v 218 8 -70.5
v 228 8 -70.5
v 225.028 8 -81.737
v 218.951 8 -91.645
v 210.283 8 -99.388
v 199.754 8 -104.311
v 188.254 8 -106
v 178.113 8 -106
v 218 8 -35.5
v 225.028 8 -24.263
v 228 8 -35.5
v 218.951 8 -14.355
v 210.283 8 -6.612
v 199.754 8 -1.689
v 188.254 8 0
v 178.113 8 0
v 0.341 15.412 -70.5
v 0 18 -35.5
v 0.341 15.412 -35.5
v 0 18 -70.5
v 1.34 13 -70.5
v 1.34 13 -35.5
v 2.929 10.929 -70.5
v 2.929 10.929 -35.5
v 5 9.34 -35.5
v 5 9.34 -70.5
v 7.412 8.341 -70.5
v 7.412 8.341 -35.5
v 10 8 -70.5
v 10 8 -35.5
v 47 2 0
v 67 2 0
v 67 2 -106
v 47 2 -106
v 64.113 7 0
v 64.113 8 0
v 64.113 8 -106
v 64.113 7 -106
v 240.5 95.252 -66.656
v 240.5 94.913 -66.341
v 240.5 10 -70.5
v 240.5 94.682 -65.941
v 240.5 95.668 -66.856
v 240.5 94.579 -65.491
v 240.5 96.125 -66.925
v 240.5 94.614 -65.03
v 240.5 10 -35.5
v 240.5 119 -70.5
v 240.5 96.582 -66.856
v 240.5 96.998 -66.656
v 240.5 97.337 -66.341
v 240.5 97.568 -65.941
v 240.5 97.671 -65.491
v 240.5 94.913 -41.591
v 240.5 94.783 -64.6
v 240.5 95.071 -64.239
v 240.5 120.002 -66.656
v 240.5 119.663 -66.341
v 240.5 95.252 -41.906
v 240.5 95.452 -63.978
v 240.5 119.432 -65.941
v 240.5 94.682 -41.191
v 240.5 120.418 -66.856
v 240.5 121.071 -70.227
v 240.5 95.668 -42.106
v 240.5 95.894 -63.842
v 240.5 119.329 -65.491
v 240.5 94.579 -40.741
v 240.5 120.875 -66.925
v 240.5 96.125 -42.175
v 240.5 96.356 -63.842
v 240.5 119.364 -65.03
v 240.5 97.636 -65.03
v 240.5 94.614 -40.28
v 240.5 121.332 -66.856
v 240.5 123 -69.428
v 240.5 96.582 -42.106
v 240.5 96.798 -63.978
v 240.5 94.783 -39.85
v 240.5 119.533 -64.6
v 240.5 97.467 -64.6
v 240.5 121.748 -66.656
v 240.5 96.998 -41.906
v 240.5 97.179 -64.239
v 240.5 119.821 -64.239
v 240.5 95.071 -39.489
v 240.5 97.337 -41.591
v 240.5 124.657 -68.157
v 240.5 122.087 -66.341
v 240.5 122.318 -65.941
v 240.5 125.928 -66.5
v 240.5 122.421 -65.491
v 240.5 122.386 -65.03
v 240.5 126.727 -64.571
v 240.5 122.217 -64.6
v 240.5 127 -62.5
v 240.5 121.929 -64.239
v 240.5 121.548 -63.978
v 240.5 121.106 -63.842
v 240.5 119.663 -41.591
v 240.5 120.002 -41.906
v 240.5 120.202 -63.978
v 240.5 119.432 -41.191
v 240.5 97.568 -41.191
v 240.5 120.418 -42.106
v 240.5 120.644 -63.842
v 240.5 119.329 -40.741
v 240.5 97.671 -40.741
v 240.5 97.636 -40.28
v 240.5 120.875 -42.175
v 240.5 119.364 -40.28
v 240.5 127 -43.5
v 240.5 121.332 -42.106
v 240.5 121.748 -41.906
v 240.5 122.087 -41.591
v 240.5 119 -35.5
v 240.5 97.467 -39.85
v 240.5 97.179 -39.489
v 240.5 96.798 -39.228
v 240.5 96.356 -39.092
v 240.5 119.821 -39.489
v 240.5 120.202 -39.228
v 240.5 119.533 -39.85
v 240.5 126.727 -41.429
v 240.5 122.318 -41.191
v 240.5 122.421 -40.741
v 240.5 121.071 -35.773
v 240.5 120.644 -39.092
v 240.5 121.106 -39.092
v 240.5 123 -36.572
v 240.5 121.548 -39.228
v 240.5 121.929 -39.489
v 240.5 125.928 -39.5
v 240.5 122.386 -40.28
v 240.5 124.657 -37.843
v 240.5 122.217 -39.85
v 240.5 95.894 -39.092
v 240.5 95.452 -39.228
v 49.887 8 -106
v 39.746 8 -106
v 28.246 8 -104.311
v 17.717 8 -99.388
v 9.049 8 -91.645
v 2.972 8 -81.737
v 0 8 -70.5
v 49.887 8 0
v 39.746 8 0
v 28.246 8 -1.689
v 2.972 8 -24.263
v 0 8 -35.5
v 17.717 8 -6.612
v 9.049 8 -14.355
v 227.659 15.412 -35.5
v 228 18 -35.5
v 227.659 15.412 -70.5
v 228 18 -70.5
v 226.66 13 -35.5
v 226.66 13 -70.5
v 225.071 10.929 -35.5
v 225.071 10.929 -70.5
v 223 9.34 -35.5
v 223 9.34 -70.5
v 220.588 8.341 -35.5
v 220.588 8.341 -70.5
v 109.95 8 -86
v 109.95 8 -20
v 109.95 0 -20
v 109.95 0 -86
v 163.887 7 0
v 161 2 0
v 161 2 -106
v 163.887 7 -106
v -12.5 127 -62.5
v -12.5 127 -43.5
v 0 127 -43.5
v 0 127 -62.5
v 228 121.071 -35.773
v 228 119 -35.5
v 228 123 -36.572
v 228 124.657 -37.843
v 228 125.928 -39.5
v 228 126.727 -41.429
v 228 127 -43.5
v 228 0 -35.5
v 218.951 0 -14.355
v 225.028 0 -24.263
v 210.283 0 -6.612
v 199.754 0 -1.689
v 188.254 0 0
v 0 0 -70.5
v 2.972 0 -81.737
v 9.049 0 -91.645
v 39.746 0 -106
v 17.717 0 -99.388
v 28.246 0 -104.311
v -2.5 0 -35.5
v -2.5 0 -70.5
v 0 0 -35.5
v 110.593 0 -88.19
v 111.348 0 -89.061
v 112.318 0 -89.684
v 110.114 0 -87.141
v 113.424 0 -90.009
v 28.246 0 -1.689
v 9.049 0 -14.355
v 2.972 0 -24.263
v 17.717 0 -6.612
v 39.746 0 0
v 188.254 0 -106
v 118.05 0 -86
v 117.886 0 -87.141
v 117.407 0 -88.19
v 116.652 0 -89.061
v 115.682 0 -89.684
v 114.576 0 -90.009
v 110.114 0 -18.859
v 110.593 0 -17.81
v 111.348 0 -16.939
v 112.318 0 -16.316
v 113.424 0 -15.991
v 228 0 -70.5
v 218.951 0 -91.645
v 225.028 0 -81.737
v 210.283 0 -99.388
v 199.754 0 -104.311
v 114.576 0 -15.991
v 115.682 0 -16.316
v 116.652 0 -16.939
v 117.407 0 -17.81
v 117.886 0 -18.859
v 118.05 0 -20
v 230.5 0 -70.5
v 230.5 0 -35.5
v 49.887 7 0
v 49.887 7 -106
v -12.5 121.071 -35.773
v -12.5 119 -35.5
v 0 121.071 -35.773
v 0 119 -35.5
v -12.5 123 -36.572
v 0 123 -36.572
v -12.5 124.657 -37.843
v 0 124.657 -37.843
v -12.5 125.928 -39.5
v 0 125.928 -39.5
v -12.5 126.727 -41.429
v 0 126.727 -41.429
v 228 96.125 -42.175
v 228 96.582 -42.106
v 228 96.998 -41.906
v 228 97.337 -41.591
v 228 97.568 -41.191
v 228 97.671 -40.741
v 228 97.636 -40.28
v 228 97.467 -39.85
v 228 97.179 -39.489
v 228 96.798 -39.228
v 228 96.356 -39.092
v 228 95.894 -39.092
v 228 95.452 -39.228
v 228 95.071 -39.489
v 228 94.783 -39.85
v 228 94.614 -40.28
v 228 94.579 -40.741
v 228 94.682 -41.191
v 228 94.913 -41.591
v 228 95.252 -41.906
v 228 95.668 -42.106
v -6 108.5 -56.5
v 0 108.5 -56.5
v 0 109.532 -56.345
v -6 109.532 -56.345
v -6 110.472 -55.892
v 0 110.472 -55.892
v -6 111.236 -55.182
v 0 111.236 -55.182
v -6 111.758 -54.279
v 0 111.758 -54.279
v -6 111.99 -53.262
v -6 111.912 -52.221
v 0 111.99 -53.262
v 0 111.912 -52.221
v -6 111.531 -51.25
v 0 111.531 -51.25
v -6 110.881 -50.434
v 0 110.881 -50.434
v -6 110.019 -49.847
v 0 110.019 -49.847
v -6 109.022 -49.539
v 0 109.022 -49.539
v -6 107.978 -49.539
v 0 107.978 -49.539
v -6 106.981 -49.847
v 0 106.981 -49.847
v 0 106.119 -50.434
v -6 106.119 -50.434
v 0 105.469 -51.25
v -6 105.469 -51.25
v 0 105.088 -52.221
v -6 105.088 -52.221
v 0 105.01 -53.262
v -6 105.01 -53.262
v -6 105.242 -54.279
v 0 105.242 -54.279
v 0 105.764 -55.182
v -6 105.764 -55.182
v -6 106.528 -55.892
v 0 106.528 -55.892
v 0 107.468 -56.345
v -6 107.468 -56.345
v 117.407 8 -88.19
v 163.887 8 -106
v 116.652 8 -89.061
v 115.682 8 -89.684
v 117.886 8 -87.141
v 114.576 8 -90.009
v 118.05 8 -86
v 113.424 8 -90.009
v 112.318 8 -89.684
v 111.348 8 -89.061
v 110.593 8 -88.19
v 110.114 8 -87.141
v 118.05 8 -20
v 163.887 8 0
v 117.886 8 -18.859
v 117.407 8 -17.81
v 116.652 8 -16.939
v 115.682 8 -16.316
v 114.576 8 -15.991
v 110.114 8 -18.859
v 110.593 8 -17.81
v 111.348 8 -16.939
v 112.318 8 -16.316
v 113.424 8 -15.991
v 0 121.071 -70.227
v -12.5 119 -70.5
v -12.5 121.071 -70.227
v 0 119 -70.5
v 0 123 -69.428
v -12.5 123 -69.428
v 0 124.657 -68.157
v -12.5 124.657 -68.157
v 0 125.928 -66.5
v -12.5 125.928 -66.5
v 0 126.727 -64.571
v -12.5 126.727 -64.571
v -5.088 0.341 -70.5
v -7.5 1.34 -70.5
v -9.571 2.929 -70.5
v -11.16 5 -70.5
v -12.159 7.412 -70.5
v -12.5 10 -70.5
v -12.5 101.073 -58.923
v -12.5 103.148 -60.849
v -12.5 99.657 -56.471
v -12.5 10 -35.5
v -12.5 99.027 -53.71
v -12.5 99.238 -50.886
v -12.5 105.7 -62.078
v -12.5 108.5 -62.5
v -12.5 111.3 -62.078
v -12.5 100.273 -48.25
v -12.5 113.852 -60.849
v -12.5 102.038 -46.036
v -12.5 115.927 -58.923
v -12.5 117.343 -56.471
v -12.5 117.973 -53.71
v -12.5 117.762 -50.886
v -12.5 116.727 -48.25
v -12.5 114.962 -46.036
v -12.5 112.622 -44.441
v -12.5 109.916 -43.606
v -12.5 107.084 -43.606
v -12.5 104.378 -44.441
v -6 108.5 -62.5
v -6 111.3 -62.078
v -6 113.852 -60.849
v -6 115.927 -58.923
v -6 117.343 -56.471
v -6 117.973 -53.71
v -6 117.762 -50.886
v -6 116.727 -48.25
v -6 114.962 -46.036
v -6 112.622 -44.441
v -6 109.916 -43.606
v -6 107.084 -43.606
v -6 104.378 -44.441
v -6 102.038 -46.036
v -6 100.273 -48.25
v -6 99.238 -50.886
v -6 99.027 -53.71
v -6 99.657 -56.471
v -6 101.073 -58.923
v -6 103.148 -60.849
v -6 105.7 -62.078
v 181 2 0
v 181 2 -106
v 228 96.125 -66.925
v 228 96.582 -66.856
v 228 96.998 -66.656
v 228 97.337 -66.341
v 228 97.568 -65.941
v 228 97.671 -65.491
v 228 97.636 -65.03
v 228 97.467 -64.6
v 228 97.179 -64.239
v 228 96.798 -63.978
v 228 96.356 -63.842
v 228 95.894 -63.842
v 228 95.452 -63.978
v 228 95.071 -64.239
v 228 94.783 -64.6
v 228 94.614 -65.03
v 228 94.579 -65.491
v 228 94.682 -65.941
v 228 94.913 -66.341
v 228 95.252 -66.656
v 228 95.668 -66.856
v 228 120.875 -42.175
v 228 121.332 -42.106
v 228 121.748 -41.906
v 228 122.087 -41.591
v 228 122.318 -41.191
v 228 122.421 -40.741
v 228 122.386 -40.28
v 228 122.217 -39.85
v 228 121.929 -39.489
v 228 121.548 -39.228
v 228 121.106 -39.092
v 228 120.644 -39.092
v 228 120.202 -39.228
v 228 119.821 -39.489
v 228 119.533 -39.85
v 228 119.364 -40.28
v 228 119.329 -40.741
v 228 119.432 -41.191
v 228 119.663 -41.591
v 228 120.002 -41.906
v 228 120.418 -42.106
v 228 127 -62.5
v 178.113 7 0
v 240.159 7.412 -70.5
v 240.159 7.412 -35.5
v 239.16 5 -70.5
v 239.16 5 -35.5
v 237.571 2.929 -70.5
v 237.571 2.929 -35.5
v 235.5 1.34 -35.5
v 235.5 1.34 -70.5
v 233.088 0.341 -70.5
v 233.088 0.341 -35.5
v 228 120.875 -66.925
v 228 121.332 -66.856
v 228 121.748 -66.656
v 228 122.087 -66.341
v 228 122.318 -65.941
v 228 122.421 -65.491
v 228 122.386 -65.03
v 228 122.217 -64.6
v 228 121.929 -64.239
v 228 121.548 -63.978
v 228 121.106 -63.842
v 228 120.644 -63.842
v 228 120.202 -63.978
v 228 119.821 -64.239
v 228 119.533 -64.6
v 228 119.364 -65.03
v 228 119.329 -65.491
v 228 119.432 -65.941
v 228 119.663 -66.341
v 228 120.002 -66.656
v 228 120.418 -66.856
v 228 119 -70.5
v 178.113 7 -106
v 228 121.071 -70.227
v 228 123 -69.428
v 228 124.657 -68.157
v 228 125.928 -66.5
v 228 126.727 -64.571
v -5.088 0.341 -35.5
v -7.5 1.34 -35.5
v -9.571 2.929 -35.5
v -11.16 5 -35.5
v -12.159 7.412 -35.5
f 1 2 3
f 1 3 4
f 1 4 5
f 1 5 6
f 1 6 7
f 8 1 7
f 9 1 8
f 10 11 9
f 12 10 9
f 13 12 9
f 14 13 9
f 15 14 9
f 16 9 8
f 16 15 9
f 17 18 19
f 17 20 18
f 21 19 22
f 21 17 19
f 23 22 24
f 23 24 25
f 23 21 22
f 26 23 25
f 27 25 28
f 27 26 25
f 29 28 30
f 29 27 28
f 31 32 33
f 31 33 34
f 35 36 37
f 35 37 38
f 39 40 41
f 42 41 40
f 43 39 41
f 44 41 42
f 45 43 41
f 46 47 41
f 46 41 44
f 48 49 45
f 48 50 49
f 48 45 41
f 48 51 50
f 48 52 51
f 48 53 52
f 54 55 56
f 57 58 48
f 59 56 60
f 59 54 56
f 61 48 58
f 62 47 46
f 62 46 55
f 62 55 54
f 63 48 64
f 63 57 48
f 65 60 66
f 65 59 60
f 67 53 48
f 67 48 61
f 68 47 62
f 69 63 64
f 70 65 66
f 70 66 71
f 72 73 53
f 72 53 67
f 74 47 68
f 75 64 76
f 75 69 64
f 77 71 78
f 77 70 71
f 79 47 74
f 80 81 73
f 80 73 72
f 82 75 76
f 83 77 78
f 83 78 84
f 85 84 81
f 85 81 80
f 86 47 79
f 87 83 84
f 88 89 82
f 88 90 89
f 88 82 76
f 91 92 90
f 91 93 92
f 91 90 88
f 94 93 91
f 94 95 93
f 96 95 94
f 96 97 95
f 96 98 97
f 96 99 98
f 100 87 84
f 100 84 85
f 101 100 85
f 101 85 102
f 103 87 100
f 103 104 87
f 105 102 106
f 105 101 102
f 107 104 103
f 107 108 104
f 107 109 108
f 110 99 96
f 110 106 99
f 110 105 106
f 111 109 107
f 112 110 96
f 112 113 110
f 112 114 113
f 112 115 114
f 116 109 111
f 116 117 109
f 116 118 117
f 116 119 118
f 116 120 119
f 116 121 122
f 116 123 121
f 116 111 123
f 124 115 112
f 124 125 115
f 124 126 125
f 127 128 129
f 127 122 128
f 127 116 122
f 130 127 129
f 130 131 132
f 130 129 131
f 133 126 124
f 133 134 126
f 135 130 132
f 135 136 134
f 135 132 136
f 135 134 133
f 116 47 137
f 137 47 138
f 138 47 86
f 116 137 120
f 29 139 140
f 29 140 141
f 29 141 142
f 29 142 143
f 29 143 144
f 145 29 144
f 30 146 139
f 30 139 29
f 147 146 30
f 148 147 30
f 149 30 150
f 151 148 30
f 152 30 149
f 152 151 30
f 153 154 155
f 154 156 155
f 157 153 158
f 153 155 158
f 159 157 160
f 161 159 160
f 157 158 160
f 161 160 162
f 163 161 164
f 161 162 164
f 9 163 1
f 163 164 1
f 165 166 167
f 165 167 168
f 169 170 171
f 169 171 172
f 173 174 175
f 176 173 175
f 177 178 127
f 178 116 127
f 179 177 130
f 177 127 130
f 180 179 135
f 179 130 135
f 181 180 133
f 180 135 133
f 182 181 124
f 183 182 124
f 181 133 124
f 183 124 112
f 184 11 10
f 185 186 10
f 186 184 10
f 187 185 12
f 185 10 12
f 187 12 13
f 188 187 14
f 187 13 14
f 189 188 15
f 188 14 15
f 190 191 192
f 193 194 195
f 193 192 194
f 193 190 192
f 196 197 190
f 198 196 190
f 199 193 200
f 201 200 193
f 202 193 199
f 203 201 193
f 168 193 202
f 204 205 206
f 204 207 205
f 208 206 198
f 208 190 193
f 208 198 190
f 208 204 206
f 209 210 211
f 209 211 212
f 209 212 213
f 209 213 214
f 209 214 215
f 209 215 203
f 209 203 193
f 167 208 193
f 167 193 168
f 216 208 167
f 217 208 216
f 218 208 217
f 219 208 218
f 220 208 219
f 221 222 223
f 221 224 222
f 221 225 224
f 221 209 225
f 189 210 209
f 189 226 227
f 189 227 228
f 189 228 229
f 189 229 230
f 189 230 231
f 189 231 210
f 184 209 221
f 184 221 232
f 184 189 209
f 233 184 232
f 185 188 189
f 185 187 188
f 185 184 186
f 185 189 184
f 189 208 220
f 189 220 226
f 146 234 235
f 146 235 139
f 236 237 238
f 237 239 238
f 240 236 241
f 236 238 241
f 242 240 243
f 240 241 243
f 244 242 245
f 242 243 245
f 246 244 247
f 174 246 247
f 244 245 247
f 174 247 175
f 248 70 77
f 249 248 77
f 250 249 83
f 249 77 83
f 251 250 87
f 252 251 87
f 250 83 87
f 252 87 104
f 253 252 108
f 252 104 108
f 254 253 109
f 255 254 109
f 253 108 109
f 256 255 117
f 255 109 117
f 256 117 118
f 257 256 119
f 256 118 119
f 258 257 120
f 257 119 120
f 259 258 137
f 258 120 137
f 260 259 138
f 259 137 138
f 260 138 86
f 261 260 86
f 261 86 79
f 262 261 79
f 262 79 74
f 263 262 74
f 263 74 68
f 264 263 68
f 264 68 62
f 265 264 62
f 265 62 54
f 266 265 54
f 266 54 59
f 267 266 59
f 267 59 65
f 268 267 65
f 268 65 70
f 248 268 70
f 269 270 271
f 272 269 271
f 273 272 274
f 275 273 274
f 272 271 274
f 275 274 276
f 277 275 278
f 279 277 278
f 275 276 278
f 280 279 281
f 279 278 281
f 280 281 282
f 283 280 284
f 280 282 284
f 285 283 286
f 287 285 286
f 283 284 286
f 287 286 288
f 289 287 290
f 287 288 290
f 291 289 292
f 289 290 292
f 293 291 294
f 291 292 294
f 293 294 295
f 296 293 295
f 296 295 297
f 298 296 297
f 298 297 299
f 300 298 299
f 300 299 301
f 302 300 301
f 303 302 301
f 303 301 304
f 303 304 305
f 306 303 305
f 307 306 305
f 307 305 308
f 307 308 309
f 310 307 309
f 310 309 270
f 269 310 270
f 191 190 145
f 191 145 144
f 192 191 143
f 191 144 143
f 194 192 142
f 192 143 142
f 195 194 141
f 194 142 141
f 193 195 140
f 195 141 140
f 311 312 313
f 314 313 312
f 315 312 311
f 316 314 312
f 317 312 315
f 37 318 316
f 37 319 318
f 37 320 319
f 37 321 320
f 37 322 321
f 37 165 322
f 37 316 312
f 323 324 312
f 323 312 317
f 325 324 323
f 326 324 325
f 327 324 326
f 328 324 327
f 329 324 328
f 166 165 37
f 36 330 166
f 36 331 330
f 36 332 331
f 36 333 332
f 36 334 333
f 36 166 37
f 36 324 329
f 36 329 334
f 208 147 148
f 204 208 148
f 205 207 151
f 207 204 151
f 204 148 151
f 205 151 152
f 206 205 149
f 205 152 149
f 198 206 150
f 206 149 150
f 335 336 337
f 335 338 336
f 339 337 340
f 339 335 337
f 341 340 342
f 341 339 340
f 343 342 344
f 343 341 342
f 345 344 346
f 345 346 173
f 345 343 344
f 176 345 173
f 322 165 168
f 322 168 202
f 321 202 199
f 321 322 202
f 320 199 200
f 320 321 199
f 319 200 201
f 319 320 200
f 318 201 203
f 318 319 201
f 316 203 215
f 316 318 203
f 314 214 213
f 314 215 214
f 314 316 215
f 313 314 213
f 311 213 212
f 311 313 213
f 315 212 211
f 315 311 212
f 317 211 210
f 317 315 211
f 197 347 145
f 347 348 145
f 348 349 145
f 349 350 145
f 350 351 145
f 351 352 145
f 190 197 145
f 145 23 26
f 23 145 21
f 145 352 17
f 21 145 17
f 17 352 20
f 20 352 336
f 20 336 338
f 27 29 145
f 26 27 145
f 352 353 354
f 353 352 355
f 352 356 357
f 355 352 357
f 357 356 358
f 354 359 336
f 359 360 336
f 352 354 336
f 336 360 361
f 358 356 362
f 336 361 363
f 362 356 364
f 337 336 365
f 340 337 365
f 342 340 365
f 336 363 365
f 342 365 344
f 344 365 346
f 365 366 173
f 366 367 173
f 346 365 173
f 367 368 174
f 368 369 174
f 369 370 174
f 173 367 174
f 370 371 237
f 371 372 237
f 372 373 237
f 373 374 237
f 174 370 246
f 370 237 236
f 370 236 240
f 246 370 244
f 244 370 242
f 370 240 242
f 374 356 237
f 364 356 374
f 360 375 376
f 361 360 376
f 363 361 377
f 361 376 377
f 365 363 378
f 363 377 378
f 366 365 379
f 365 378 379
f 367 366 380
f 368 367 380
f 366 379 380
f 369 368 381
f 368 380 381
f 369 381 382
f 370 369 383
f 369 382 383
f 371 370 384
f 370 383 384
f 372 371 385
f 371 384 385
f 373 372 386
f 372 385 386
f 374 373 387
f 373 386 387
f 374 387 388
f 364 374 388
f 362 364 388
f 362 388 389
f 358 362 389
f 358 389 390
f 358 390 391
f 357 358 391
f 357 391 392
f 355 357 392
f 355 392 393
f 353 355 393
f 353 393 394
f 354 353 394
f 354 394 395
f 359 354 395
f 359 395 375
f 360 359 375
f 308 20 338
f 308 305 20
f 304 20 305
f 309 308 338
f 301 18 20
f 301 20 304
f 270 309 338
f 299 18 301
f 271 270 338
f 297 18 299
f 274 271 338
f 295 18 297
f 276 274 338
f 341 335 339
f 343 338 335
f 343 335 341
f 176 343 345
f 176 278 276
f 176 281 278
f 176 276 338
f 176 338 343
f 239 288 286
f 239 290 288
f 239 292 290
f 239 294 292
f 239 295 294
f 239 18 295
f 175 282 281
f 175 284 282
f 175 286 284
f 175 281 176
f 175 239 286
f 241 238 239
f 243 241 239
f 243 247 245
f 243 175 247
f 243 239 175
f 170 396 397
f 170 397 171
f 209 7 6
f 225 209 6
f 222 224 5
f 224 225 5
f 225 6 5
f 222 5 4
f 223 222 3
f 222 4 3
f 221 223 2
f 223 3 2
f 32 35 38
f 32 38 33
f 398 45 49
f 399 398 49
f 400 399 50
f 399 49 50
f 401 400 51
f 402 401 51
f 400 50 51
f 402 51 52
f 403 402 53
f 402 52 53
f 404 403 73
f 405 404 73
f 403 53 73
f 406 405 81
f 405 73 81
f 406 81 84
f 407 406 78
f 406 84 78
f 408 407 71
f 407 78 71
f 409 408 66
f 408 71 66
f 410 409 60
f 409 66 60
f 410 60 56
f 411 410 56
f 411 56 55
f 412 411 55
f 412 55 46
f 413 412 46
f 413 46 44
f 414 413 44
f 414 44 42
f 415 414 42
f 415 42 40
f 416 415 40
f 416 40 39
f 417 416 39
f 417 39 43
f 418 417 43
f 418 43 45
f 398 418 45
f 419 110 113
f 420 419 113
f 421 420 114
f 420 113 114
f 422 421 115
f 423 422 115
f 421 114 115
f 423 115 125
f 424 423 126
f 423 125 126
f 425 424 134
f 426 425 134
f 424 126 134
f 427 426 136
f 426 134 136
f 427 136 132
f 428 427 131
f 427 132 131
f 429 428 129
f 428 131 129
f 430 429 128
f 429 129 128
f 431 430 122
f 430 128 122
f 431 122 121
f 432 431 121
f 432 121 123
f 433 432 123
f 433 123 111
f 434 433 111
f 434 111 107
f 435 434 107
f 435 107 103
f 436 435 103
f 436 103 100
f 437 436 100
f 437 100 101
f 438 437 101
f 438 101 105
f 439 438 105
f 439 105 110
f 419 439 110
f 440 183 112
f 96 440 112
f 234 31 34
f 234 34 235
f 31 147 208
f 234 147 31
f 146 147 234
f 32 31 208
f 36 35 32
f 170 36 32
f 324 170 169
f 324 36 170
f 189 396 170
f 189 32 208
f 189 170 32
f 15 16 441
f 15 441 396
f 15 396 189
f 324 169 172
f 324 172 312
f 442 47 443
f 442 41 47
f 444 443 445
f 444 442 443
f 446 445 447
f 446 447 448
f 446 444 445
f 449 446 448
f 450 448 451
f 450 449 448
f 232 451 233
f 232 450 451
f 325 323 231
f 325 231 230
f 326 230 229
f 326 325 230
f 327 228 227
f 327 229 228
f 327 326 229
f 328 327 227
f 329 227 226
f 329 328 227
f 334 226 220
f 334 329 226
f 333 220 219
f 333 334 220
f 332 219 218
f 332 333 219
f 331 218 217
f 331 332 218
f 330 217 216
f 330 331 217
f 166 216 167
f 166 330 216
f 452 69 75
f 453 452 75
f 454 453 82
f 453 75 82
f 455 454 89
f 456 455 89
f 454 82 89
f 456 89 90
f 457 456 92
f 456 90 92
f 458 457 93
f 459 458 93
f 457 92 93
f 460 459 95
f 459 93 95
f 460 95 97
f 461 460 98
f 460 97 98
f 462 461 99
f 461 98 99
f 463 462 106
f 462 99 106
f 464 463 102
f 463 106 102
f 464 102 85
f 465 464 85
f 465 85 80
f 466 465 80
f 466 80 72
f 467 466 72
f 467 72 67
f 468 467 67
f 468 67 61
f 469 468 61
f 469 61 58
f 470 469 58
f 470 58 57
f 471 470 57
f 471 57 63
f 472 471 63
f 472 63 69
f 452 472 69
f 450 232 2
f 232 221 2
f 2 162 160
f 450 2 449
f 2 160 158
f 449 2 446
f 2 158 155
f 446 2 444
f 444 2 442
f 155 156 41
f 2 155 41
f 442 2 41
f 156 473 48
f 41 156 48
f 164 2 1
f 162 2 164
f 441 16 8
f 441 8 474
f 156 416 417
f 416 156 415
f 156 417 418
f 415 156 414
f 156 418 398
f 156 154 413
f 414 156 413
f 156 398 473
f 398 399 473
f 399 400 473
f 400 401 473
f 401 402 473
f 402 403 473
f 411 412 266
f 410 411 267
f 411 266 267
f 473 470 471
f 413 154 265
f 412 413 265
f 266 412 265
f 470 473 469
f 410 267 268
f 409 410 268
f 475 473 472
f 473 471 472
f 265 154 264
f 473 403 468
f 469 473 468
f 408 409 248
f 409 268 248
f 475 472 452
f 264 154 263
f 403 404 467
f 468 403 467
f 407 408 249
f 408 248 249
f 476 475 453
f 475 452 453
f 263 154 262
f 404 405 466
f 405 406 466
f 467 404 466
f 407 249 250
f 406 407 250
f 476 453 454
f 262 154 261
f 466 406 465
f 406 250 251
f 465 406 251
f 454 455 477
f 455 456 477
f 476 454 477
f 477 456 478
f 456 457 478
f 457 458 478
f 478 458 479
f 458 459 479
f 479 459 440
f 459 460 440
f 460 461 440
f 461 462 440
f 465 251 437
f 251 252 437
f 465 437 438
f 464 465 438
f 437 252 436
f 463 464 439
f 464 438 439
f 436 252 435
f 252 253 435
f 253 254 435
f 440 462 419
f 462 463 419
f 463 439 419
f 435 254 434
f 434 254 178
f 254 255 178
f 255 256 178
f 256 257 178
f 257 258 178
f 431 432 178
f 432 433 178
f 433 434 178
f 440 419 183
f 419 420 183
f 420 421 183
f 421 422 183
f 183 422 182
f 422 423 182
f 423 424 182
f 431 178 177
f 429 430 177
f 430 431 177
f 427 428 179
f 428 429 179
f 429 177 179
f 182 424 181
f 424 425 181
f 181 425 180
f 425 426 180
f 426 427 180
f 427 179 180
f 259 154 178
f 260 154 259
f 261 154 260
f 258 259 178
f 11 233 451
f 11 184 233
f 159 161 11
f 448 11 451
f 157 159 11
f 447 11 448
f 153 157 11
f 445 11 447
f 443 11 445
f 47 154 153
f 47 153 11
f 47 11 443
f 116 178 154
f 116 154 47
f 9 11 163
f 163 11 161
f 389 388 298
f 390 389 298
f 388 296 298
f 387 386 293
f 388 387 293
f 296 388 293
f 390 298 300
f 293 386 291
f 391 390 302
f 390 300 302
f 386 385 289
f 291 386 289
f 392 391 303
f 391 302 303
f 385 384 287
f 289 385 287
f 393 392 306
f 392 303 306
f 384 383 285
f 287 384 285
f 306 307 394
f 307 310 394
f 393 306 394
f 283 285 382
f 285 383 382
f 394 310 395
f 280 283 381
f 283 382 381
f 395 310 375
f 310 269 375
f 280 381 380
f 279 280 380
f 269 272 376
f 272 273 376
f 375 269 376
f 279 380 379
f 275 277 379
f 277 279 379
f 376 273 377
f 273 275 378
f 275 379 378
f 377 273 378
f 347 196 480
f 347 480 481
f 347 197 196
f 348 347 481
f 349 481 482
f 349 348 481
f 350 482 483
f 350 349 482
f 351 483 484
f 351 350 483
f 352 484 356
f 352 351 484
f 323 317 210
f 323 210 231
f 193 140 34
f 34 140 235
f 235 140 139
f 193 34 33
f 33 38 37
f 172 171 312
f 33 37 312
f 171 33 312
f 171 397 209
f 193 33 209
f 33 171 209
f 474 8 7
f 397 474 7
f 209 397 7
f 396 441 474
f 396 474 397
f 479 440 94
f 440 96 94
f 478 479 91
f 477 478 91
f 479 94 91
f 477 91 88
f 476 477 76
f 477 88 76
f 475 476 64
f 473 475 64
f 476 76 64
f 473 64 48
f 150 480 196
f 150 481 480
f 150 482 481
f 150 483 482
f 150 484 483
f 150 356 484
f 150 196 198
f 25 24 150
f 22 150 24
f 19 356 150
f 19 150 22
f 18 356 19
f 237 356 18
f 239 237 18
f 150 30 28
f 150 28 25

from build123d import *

# Parameters (mm, degrees)
SKETCH1_W           = 12.5
SKETCH1_H           = 127
BOSS_EXTRUDE1_DEPTH = 106
SKETCH2_W           = 12.5
SKETCH2_H           = 35.5
CUT_EXTRUDE1_DEPTH  = 200
FILLET3_R           = 8
FILLET4_R           = 10
FILLET5_R           = 40
SKETCH5_R           = 3.5
CUT_EXTRUDE5_DEPTH  = 25
CUT_EXTRUDE6_START  = -6
SKETCH5_3_R         = 9.5
SKETCH5_3_R_2       = 3.5
CUT_EXTRUDE6_DEPTH  = 7
SKETCH4_R           = 1.55
CUT_EXTRUDE7_DEPTH  = 16


with BuildPart() as part:
    # Sketch1 → Boss-Extrude1 (new body)
    with BuildSketch(Plane.XY):
        Polygon((0, 8), (0, 0), (228, 0), (228, 8), (178.113248654, 8), (178.113248654, 7), (181, 2), (161, 2), (163.886751346, 7), (163.886751346, 8), (64.113248654, 8), (64.113248654, 7), (67, 2), (47, 2), (49.886751346, 7), (49.886751346, 8), align=None)
        with Locations((234.25, 63.5)):
            Rectangle(SKETCH1_W, SKETCH1_H)
        with Locations((-6.25, 63.5)):
            Rectangle(SKETCH1_W, SKETCH1_H)
    extrude(amount=-BOSS_EXTRUDE1_DEPTH)

    # Sketch2 → Cut-Extrude1 (cut)
    with BuildSketch(Plane(origin=(0, 127, 0), x_dir=(1, 0, 0), z_dir=(0, 1, 0))):
        with Locations((-6.25, 88.25)):
            Rectangle(SKETCH2_W, SKETCH2_H)
        with Locations((-6.25, 17.75)):
            Rectangle(SKETCH2_W, SKETCH2_H)
        with Locations((234.25, 88.25)):
            Rectangle(SKETCH2_W, SKETCH2_H)
        with Locations((234.25, 17.75)):
            Rectangle(SKETCH2_W, SKETCH2_H)
        with BuildLine():
            Line((109.95, 20), (109.95, 86))
            ThreePointArc((109.95, 86), (114, 90.05), (118.05, 86))
            Line((118.05, 86), (118.05, 20))
            ThreePointArc((118.05, 20), (114, 15.95), (109.95, 20))
        make_face()
    extrude(amount=-CUT_EXTRUDE1_DEPTH, mode=Mode.SUBTRACT)

    # Fillet3
    fillet3_edges = [part.edges().sort_by_distance(p)[0] for p in [
        (-6.25, 127, -35.5),
        (234.25, 127, -70.5),
        (234.25, 127, -35.5),
        (-6.25, 127, -70.5),
    ]]
    fillet(fillet3_edges, radius=FILLET3_R)

    # Fillet4
    fillet4_edges = [part.edges().sort_by_distance(p)[0] for p in [
        (228, 8, -53),
        (240.5, 0, -53),
        (0, 8, -53),
        (-12.5, 0, -53),
    ]]
    fillet(fillet4_edges, radius=FILLET4_R)

    # Fillet5
    # the kernel refuses this fillet: 40 mm, written as the material it takes off along each edge
    with BuildSketch(Plane(origin=(228, 107.36517247, -106), x_dir=(-1, 0, 0), z_dir=(0, -1, 0))) as fillet5_piece_1:
        with BuildLine():
            CenterArc((39.746068988, -40), FILLET5_R, 90, 83.540550223)
            Line((0, -35.5), (-0.79492138, -35.41))
            ThreePointArc((-0.79492138, -35.41), (-0.8, -17.75), (-0.8, 0))
            Line((-0.8, 0), (0, 0.8))
            Line((0, 0.8), (39.746068988, 0.8))
            Line((39.746068988, 0.8), (39.746068988, 0))
        make_face()
    extrude(amount=206.73034494, mode=Mode.SUBTRACT)
    with BuildSketch(Plane(origin=(0, 107.36517247, -106), x_dir=(0, 0, 1), z_dir=(0, -1, 0))) as fillet5_piece_2:
        with BuildLine():
            CenterArc((40, -39.746068988), FILLET5_R, 96.459449777, 83.540550223)
            Line((0, -39.746068988), (-0.8, -39.746068988))
            Line((-0.8, -39.746068988), (-0.8, 0))
            Line((-0.8, 0), (0, 0.8))
            ThreePointArc((0, 0.8), (17.75, 0.8), (35.41, 0.79492138))
            Line((35.41, 0.79492138), (35.5, 0))
        make_face()
    extrude(amount=206.73034494, mode=Mode.SUBTRACT)
    with BuildSketch(Plane(origin=(0, 107.36517247, 0), x_dir=(0, 0, -1), z_dir=(0, -1, 0))) as fillet5_piece_3:
        with BuildLine():
            CenterArc((40, 39.746068988), FILLET5_R, 180, 83.540550223)
            Line((0, 39.746068988), (-0.8, 39.746068988))
            Line((-0.8, 39.746068988), (-0.8, 0))
            Line((-0.8, 0), (0, -0.8))
            ThreePointArc((0, -0.8), (17.75, -0.8), (35.41, -0.79492138))
            Line((35.41, -0.79492138), (35.5, 0))
        make_face()
    extrude(amount=206.73034494, mode=Mode.SUBTRACT)
    with BuildSketch(Plane(origin=(228, 107.36517247, 0), x_dir=(-1, 0, 0), z_dir=(0, -1, 0))) as fillet5_piece_4:
        with BuildLine():
            CenterArc((39.746068988, 40), FILLET5_R, 186.459449777, 83.540550223)
            Line((0, 35.5), (-0.79492138, 35.41))
            ThreePointArc((-0.79492138, 35.41), (-0.8, 17.75), (-0.8, 0))
            Line((-0.8, 0), (0, -0.8))
            Line((0, -0.8), (39.746068988, -0.8))
            Line((39.746068988, -0.8), (39.746068988, 0))
        make_face()
    extrude(amount=206.73034494, mode=Mode.SUBTRACT)

    # Sketch5 → Cut-Extrude5 (cut)
    with BuildSketch(Plane(origin=(0, 0, 0), x_dir=(0, 0, -1), z_dir=(1, 0, 0))):
        with Locations((53, 108.5)):
            Circle(SKETCH5_R)
    extrude(amount=-CUT_EXTRUDE5_DEPTH, mode=Mode.SUBTRACT)

    # Sketch5<3> → Cut-Extrude6 (cut)
    with BuildSketch(Plane(origin=(0, 0, 0), x_dir=(0, 0, -1), z_dir=(1, 0, 0)).offset(CUT_EXTRUDE6_START)):
        with Locations((53, 108.5)):
            Circle(SKETCH5_3_R)
        with Locations((53, 108.5)):
            Circle(SKETCH5_3_R_2, mode=Mode.SUBTRACT)
    extrude(amount=-CUT_EXTRUDE6_DEPTH, mode=Mode.SUBTRACT)

    # Sketch4 → Cut-Extrude7 (cut)
    with BuildSketch(Plane(origin=(240.5, 0, 0), x_dir=(0, 0, -1), z_dir=(1, 0, 0))):
        with Locations((40.625, 120.875)):
            Circle(SKETCH4_R)
        with Locations((40.625, 96.125)):
            Circle(SKETCH4_R)
        with Locations((65.375, 96.125)):
            Circle(SKETCH4_R)
        with Locations((65.375, 120.875)):
            Circle(SKETCH4_R)
    extrude(amount=-CUT_EXTRUDE7_DEPTH, mode=Mode.SUBTRACT)


solid = part.part
